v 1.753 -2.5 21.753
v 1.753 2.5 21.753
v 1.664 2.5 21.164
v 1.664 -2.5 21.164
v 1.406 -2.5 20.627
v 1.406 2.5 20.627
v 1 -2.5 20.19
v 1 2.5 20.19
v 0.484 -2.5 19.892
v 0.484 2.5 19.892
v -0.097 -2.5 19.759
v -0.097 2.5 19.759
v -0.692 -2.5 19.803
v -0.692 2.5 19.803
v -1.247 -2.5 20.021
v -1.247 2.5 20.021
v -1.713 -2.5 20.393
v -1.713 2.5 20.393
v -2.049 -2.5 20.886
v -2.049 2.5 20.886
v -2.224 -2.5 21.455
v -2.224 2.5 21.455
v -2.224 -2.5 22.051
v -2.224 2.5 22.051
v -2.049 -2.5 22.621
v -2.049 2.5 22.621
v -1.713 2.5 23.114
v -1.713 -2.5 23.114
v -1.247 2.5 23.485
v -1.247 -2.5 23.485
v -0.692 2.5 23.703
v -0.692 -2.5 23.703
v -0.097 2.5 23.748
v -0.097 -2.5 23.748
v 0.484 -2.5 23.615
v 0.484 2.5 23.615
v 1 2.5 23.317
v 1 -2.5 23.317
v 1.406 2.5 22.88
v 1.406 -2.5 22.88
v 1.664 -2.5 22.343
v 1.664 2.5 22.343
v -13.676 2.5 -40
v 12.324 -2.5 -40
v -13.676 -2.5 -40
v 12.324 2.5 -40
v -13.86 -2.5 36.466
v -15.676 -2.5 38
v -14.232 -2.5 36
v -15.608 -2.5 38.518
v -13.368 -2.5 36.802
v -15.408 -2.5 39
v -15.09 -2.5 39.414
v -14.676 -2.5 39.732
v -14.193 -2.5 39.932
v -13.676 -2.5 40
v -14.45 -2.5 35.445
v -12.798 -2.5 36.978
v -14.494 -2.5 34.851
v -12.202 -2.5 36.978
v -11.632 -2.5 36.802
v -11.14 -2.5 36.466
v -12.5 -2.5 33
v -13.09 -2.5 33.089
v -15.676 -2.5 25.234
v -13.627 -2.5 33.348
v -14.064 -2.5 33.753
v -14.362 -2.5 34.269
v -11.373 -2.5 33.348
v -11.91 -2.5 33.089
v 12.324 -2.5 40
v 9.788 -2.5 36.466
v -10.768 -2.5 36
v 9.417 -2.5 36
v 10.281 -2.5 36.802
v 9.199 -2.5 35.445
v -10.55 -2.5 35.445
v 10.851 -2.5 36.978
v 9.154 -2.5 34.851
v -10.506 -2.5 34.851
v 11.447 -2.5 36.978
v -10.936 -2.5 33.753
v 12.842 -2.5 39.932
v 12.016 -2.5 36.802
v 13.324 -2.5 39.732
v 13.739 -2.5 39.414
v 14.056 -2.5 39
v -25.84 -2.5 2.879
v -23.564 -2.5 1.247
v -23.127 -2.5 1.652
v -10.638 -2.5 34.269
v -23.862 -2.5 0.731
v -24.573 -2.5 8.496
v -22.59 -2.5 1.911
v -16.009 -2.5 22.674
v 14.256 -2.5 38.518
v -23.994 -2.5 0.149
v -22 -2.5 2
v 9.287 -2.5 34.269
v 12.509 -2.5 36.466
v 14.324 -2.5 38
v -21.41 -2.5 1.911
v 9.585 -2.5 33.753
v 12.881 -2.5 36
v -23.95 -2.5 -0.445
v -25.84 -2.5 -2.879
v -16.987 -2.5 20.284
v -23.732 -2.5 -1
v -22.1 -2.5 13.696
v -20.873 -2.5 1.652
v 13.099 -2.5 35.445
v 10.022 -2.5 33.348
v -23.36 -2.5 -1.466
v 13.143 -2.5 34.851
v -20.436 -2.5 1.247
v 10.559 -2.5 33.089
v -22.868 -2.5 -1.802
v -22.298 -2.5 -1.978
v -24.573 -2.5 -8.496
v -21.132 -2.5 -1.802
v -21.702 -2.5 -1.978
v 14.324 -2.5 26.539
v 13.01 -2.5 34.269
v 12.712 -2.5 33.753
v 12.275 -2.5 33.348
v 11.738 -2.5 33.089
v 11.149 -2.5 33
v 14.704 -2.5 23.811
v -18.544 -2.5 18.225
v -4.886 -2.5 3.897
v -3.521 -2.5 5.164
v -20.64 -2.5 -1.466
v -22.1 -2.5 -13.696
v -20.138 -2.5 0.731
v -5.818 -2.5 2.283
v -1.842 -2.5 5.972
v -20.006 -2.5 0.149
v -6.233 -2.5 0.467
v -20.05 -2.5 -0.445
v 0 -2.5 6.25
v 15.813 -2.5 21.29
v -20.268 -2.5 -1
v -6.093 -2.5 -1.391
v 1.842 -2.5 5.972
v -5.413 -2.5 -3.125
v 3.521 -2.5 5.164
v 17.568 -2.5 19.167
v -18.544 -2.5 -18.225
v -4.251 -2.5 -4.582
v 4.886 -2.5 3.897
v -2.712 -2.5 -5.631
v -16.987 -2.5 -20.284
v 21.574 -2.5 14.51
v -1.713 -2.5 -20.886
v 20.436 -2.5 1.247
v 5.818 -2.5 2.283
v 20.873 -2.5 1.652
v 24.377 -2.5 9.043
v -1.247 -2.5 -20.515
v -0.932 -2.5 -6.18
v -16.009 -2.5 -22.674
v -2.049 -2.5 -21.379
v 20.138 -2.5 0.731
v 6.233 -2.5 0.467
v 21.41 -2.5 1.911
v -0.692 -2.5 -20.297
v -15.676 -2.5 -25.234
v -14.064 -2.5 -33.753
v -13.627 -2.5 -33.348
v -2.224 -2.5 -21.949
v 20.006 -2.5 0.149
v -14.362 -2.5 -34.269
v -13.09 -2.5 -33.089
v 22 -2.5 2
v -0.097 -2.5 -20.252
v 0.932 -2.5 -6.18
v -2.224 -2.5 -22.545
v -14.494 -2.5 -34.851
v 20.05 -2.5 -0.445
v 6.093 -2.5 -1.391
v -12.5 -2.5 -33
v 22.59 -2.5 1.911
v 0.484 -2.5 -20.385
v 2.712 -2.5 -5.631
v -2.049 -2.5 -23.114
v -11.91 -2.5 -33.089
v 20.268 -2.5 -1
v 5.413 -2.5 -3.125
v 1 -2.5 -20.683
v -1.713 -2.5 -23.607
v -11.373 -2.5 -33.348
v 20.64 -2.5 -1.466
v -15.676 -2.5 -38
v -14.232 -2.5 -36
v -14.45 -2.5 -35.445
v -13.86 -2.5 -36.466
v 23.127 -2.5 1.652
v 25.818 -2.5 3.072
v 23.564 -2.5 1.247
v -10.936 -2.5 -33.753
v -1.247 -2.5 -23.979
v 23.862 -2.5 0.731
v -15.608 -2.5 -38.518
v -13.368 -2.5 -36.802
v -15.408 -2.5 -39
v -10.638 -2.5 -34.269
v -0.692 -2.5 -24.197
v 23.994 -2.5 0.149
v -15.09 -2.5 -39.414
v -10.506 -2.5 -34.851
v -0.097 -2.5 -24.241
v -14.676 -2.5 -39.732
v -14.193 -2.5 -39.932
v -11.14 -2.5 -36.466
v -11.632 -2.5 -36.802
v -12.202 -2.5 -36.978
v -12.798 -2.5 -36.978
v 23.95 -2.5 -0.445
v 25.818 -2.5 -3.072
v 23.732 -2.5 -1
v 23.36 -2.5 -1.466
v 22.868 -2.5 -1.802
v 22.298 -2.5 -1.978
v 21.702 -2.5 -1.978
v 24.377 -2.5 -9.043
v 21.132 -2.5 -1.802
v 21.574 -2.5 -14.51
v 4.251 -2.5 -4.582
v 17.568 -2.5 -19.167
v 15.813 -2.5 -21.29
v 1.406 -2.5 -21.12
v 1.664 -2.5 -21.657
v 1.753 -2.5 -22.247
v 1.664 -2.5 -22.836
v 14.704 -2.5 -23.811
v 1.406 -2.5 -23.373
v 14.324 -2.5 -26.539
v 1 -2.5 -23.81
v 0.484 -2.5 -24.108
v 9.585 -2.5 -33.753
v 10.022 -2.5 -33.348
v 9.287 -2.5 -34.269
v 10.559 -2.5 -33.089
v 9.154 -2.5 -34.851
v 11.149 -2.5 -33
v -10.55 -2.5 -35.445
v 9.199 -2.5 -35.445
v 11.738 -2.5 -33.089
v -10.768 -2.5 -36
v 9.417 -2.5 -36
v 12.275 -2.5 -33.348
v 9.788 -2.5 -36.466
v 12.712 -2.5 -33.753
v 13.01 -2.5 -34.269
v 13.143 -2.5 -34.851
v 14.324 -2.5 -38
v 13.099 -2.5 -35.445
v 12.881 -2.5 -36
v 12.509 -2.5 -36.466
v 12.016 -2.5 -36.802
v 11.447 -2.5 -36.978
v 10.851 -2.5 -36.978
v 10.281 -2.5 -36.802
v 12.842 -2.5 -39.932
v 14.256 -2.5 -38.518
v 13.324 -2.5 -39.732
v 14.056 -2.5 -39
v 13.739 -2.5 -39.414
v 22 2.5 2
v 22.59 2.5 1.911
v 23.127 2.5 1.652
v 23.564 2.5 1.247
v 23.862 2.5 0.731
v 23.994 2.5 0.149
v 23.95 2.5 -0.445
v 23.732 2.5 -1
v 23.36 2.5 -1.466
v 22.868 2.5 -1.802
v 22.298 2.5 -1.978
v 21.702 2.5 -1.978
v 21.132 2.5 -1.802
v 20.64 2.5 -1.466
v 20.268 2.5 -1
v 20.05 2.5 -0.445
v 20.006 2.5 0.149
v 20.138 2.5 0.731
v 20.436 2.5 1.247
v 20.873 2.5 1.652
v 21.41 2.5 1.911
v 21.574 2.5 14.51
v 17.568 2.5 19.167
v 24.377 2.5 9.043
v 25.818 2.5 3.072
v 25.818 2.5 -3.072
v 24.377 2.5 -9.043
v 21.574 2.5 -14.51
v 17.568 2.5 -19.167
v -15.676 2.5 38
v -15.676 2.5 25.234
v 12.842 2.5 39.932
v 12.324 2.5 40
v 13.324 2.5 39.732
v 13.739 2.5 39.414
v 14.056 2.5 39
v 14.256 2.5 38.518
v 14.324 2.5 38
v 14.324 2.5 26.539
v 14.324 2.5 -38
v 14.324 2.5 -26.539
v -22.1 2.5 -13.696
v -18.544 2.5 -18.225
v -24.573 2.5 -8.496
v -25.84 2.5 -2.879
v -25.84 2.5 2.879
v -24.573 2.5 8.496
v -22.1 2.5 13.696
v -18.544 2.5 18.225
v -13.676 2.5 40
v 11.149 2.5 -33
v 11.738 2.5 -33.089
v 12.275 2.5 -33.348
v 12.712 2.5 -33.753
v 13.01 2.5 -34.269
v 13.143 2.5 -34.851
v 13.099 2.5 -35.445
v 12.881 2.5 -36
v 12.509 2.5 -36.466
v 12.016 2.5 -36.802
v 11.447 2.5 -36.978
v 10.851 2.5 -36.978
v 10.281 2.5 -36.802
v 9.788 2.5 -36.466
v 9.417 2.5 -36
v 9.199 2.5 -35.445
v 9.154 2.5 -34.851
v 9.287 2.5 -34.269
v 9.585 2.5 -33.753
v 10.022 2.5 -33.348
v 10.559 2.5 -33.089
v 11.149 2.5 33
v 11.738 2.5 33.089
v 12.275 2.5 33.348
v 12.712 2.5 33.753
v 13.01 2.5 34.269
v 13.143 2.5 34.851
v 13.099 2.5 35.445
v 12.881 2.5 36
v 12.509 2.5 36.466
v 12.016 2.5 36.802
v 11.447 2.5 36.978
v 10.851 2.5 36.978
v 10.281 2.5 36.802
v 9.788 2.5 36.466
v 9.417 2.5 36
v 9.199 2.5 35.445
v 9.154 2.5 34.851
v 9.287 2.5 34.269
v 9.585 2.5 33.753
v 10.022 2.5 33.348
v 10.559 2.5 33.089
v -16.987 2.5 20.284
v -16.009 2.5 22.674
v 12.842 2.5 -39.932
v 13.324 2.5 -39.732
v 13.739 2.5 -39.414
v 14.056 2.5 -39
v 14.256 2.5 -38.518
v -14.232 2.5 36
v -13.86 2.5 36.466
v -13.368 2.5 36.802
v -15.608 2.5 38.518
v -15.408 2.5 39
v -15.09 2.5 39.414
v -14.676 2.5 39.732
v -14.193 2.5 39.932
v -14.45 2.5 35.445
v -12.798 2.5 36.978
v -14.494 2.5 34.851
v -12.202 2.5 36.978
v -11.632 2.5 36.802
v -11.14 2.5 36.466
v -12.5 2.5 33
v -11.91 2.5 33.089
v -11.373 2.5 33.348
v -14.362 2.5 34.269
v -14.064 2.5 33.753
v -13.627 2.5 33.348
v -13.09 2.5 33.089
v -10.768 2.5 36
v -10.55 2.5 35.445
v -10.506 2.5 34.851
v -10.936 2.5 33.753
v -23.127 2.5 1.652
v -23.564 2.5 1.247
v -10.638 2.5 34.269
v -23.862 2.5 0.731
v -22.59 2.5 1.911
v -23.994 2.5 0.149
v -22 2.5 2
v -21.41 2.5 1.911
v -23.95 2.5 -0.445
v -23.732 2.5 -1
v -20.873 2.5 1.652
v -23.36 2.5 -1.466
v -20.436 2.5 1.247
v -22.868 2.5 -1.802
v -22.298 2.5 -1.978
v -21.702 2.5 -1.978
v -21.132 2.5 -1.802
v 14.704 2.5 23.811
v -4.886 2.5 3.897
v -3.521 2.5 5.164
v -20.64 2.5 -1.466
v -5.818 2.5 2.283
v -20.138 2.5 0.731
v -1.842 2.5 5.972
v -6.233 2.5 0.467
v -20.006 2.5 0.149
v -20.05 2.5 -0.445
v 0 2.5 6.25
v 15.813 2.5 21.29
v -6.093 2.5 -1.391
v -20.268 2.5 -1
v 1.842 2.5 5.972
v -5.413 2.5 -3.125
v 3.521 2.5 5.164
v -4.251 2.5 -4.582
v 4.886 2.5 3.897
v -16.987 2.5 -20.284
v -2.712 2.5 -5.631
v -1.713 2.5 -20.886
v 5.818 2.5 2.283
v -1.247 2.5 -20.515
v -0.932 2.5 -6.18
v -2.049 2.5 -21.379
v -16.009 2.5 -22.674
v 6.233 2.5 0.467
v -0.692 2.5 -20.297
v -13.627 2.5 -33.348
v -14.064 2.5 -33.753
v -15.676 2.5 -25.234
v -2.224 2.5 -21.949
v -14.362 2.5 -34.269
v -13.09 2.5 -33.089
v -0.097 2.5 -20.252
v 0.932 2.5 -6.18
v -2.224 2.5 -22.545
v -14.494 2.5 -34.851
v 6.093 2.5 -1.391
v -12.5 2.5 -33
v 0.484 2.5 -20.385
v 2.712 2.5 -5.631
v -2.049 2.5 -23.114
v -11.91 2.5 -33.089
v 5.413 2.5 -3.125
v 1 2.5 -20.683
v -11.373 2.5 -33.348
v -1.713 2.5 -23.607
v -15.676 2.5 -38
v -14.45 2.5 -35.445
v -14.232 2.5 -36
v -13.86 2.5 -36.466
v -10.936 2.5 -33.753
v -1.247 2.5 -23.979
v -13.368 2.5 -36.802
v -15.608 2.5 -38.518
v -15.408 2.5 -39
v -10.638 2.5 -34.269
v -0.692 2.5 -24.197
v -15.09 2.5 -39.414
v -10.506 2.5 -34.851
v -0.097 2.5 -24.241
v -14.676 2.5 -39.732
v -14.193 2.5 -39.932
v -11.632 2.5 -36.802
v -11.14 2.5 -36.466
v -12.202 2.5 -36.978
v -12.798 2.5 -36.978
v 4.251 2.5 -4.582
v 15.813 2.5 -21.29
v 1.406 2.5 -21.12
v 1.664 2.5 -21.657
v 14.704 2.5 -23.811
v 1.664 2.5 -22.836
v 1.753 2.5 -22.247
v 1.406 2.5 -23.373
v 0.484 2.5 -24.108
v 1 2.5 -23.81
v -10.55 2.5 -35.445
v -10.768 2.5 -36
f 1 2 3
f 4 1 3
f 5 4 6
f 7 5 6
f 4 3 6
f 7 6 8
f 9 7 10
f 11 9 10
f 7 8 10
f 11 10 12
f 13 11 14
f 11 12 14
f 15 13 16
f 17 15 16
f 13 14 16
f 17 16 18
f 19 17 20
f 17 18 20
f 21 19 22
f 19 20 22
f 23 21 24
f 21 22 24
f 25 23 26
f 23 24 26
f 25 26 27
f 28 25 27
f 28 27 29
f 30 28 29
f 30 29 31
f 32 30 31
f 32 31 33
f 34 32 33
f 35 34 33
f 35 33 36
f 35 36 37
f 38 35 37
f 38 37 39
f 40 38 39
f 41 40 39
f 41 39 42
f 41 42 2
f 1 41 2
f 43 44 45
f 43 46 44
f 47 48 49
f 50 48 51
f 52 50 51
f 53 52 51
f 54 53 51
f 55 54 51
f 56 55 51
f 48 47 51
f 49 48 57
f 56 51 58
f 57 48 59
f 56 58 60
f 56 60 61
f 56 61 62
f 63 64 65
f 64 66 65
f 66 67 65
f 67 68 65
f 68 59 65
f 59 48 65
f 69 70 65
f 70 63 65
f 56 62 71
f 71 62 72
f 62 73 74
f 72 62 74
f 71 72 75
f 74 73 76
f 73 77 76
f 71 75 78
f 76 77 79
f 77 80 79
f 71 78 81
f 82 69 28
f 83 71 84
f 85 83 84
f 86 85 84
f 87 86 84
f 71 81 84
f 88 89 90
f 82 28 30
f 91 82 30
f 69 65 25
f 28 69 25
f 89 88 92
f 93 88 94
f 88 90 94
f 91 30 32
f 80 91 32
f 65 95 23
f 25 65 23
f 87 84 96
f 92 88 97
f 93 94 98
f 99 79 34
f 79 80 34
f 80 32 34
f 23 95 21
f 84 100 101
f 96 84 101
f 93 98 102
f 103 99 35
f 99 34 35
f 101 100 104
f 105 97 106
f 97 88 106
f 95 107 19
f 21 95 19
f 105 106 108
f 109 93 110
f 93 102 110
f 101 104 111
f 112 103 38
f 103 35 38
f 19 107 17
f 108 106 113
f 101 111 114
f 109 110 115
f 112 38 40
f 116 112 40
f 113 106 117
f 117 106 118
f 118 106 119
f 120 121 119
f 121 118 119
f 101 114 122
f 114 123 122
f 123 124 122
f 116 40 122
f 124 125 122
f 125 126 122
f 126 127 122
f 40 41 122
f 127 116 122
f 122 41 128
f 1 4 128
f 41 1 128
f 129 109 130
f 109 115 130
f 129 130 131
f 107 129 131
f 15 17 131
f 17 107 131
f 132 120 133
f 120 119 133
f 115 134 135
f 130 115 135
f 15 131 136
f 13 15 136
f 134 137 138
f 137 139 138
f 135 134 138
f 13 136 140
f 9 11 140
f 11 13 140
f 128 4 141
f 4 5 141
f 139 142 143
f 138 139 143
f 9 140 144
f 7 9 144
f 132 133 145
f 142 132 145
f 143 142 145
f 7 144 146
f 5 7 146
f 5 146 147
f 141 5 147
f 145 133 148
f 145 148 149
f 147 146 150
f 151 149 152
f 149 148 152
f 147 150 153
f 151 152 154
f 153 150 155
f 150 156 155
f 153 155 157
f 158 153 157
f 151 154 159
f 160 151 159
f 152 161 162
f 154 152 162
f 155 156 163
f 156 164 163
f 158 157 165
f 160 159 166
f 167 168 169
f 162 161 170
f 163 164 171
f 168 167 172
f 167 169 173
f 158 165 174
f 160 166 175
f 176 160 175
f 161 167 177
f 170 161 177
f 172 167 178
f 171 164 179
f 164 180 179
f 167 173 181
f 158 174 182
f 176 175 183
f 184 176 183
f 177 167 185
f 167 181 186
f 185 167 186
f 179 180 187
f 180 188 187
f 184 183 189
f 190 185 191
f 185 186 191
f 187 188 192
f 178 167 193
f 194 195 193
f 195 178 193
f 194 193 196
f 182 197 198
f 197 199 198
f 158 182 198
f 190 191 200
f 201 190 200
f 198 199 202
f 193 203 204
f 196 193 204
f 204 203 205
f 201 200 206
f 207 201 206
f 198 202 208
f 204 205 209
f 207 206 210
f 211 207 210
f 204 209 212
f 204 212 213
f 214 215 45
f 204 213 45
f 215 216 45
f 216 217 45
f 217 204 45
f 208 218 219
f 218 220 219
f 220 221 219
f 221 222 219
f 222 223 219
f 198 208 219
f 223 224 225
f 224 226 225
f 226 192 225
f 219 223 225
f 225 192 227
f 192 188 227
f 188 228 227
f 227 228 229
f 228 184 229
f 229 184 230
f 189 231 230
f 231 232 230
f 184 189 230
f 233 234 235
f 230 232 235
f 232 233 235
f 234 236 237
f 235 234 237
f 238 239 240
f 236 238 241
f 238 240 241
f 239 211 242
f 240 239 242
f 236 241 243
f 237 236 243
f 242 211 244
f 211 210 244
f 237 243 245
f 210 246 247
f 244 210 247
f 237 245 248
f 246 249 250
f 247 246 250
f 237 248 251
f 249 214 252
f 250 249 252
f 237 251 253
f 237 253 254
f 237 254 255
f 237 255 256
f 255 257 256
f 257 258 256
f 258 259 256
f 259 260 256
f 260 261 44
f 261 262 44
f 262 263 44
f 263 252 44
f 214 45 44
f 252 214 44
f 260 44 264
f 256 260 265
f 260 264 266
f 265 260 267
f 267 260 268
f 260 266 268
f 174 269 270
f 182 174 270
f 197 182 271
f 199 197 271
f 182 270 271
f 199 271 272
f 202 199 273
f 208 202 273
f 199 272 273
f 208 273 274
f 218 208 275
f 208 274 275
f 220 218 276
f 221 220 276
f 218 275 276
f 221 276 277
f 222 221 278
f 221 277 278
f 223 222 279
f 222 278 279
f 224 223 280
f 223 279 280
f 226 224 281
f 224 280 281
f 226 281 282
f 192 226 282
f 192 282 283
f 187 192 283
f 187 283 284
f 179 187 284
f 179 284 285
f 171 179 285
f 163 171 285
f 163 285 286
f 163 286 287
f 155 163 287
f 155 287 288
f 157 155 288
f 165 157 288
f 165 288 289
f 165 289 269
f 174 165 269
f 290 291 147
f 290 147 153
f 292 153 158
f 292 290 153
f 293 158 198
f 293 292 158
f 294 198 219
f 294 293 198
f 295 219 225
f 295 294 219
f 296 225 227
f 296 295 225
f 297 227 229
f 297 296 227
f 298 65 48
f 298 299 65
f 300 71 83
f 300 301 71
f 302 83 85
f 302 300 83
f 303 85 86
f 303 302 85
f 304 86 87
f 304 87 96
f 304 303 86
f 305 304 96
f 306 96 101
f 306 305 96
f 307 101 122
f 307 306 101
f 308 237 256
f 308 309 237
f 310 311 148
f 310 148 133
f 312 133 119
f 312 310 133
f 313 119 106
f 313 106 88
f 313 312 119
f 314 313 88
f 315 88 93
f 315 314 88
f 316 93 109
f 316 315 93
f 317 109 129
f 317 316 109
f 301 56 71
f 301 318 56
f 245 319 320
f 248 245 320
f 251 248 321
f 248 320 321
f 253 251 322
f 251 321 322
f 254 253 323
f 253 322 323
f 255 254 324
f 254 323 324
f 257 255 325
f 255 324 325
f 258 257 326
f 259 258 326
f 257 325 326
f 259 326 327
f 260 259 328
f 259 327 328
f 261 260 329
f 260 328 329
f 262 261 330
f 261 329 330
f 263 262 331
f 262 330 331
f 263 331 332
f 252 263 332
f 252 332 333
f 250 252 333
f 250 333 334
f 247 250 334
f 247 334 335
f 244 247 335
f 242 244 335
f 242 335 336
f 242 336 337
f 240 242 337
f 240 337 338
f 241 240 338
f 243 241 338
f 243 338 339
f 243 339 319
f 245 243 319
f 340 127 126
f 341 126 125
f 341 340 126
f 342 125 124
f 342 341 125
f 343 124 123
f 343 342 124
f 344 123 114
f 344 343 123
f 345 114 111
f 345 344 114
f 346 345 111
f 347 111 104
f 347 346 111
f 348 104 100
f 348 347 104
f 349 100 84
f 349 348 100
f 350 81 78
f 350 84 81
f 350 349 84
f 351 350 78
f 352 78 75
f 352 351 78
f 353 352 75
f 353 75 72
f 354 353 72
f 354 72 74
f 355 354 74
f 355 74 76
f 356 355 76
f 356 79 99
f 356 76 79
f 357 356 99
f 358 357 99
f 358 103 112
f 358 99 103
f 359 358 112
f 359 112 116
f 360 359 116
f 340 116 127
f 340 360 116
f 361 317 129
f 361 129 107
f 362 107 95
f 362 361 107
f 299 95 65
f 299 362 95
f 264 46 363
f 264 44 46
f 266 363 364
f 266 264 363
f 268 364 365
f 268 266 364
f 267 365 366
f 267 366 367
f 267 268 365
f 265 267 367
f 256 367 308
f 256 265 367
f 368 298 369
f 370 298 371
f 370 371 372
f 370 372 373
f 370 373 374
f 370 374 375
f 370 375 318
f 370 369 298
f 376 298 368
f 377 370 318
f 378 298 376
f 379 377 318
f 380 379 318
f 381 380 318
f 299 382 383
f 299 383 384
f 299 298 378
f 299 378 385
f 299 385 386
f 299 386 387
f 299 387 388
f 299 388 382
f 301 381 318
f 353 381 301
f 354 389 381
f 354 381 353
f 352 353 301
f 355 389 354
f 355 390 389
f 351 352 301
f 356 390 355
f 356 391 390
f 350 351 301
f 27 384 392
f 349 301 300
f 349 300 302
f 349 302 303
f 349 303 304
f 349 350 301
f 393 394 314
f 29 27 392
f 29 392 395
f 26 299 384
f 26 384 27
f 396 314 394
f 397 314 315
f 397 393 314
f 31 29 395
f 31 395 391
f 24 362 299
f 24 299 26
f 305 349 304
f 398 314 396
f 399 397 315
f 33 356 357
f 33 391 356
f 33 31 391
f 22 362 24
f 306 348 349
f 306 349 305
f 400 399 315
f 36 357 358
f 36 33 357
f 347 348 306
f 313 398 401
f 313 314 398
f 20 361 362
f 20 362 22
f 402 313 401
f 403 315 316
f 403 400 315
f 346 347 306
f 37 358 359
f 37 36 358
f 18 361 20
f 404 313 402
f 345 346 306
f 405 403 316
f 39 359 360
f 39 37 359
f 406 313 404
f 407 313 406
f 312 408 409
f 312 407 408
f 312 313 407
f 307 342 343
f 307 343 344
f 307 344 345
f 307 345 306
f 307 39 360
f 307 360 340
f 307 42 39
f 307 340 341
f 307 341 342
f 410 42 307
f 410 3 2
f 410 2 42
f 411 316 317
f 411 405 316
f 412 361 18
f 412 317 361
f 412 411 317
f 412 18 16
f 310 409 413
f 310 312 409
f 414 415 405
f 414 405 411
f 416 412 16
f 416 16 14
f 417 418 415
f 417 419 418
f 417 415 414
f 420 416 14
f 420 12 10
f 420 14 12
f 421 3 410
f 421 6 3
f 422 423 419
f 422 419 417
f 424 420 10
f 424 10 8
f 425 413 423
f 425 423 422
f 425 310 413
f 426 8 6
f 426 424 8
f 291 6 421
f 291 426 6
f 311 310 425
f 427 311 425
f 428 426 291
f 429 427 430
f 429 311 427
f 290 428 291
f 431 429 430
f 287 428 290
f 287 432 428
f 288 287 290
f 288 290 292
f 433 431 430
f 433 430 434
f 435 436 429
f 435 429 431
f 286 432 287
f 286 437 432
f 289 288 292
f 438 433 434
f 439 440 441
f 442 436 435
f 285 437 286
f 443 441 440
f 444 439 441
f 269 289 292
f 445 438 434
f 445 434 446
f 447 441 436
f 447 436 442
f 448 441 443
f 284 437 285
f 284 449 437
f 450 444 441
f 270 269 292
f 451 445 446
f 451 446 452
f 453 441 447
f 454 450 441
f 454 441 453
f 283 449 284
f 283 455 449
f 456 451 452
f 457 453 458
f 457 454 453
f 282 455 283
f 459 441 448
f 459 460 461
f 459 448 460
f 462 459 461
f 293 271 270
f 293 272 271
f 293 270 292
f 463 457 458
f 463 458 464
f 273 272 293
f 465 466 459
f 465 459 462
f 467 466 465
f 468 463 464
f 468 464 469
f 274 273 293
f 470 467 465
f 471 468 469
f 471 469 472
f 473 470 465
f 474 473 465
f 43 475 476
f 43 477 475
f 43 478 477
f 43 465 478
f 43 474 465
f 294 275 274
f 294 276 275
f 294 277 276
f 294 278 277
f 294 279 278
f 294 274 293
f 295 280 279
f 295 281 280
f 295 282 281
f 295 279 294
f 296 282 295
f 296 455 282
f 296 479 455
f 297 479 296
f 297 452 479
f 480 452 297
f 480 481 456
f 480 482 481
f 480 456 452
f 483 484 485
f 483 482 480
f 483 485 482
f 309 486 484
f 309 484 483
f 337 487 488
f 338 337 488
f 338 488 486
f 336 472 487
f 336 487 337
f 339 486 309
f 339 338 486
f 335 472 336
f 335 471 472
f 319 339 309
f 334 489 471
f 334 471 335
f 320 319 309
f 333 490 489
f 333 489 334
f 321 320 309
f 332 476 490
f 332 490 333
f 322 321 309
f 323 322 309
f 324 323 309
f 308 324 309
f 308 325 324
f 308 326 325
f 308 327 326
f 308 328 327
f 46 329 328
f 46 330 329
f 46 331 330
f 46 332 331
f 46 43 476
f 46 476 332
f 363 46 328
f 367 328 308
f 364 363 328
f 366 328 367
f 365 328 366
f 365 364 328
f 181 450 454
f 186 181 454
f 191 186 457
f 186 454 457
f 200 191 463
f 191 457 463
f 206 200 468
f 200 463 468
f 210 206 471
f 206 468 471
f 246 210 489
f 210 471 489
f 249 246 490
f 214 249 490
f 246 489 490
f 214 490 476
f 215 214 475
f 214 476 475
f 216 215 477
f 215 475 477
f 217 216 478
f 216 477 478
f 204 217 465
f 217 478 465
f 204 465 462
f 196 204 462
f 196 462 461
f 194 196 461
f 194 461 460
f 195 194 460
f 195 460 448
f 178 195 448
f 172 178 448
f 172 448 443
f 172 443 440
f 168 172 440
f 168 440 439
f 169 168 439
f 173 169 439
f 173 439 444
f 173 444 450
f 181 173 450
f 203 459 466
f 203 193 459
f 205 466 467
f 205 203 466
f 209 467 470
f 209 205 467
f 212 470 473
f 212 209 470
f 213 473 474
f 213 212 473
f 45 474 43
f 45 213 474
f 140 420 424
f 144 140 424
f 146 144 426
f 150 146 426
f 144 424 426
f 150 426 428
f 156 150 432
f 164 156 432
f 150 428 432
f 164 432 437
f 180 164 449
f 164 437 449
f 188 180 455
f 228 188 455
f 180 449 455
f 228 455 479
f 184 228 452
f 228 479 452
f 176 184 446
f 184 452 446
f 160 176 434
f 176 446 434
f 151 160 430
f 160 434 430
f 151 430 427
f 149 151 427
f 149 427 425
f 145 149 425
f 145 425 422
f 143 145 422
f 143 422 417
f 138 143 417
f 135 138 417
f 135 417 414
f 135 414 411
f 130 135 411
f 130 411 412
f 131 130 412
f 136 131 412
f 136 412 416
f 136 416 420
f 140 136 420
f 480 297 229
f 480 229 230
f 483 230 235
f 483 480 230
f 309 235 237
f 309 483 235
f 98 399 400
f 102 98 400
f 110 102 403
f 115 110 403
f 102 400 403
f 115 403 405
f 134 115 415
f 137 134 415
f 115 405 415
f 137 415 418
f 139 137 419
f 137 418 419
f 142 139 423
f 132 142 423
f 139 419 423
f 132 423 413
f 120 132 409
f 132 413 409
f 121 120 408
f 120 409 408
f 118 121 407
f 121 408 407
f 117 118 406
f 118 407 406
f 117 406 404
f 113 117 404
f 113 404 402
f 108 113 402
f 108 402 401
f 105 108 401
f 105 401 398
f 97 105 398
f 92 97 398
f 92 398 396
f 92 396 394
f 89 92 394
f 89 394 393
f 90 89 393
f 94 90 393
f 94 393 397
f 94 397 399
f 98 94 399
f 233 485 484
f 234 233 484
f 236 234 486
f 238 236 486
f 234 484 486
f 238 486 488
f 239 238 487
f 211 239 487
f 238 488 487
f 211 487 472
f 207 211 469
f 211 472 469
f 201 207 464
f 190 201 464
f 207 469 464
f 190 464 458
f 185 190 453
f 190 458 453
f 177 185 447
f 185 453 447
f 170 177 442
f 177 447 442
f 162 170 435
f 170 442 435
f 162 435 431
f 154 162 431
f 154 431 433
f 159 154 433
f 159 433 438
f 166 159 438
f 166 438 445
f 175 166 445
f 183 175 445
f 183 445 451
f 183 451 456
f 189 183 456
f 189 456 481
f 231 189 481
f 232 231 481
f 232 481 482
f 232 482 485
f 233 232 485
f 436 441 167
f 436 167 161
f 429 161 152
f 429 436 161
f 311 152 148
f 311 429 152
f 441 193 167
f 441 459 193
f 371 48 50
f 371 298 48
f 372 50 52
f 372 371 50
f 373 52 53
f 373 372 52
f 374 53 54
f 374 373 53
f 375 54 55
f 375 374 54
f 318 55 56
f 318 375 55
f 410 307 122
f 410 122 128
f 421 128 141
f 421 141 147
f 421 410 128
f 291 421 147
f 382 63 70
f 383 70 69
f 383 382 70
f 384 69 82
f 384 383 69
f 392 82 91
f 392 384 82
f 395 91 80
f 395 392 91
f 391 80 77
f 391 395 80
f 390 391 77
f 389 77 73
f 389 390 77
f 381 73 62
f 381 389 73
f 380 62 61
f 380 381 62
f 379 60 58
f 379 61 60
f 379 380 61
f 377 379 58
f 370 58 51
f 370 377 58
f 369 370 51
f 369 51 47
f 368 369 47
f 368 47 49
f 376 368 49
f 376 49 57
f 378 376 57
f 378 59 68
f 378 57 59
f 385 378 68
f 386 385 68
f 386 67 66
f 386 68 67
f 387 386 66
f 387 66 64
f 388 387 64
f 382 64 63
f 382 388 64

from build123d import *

# Parameters (mm, degrees)
Y_KSEKLIK_EKSTR_ZYON1_DEPTH = 2.5
IZIM2_R                     = 2
KES_EKSTR_ZYON1_DEPTH       = 27
DAIRESEL_KAPLAMA1_COUNT     = 2
DAIRESEL_KAPLAMA1_ANGLE     = 90
IZIM3_R                     = 6.25
KES_EKSTR_ZYON2_DEPTH       = 27
IZIM4_R                     = 2
KES_EKSTR_ZYON3_DEPTH       = 27
RADYUS1_R                   = 2


with BuildPart() as part:
    # Çizim1 → Yükseklik-Ekstrüzyon1 (new, symmetric)
    with BuildSketch(Plane(origin=(0, 0, 0), x_dir=(1, 0, 0), z_dir=(0, 1, 0))):
        with BuildLine():
            Line((-15.675675676, 40), (-15.675675676, 25.234097539))
            ThreePointArc((-15.675675676, 25.234097539), (-16.420371215, 21.447365526), (-18.543543544, 18.224626))
            ThreePointArc((-18.543543544, 18.224626), (-26, 0), (-18.543543544, -18.224626))
            ThreePointArc((-18.543543544, -18.224626), (-16.420371215, -21.447365526), (-15.675675676, -25.234097539))
            Line((-15.675675676, -25.234097539), (-15.675675676, -40))
            Line((-15.675675676, -40), (14.324324324, -40))
            Line((14.324324324, -40), (14.324324324, -26.539164383))
            ThreePointArc((14.324324324, -26.539164383), (15.170976096, -22.512228052), (17.567567568, -19.167174277))
            ThreePointArc((17.567567568, -19.167174277), (26, 0), (17.567567568, 19.167174277))
            ThreePointArc((17.567567568, 19.167174277), (15.170976096, 22.512228052), (14.324324324, 26.539164383))
            Line((14.324324324, 26.539164383), (14.324324324, 40))
            Line((14.324324324, 40), (-15.675675676, 40))
        make_face()
    extrude(amount=Y_KSEKLIK_EKSTR_ZYON1_DEPTH, both=True)

    # Çizim2 → Kes-Ekstrüzyon1 (cut)
    with BuildSketch(Plane(origin=(0, 2.5, 0), x_dir=(1, 0, 0), z_dir=(0, 1, 0))):
        with Locations(Location((-22, 0, 0), (0, 0, 270))):
            Circle(IZIM2_R)
        with Locations(Location((22, 0, 0), (0, 0, 270))):
            Circle(IZIM2_R)
    kes_ekstr_zyon1 = extrude(amount=-KES_EKSTR_ZYON1_DEPTH, mode=Mode.SUBTRACT)

    # Dairesel Kaplama1: Kes-Ekstrüzyon1 ×2 about axis
    dairesel_kaplama1_axis = Axis((-0.246697988, 0, 0), (0, 1, 0))
    for i in range(1, DAIRESEL_KAPLAMA1_COUNT):
        add(kes_ekstr_zyon1.rotate(dairesel_kaplama1_axis, i * DAIRESEL_KAPLAMA1_ANGLE / (DAIRESEL_KAPLAMA1_COUNT - 1)), mode=Mode.SUBTRACT)

    # Çizim3 → Kes-Ekstrüzyon2 (cut)
    with BuildSketch(Plane(origin=(0, 2.5, 0), x_dir=(1, 0, 0), z_dir=(0, 1, 0))):
        with Locations(Location((0, 0, 0), (0, 0, 270))):
            Circle(IZIM3_R)
    extrude(amount=-KES_EKSTR_ZYON2_DEPTH, mode=Mode.SUBTRACT)

    # Çizim4 → Kes-Ekstrüzyon3 (cut)
    with BuildSketch(Plane(origin=(0, 2.5, 0), x_dir=(1, 0, 0), z_dir=(0, 1, 0))):
        with Locations(Location((-12.5, 35, 0), (0, 0, 270))):
            Circle(IZIM4_R)
        with Locations(Location((11.148648649, 35, 0), (0, 0, 270))):
            Circle(IZIM4_R)
    kes_ekstr_zyon3 = extrude(amount=-KES_EKSTR_ZYON3_DEPTH, mode=Mode.SUBTRACT)

    # Aynalama1: Kes-Ekstrüzyon3 across plane
    add(kes_ekstr_zyon3.mirror(Plane.XY), mode=Mode.SUBTRACT)

    # Radyus1
    radyus1_edges = [part.edges().sort_by_distance(p)[0] for p in [
        (-15.675675676, 0, -40),
        (14.324324324, 0, -40),
        (14.324324324, 0, 40),
        (-15.675675676, 0, 40),
    ]]
    fillet(radyus1_edges, radius=RADYUS1_R)


solid = part.part
